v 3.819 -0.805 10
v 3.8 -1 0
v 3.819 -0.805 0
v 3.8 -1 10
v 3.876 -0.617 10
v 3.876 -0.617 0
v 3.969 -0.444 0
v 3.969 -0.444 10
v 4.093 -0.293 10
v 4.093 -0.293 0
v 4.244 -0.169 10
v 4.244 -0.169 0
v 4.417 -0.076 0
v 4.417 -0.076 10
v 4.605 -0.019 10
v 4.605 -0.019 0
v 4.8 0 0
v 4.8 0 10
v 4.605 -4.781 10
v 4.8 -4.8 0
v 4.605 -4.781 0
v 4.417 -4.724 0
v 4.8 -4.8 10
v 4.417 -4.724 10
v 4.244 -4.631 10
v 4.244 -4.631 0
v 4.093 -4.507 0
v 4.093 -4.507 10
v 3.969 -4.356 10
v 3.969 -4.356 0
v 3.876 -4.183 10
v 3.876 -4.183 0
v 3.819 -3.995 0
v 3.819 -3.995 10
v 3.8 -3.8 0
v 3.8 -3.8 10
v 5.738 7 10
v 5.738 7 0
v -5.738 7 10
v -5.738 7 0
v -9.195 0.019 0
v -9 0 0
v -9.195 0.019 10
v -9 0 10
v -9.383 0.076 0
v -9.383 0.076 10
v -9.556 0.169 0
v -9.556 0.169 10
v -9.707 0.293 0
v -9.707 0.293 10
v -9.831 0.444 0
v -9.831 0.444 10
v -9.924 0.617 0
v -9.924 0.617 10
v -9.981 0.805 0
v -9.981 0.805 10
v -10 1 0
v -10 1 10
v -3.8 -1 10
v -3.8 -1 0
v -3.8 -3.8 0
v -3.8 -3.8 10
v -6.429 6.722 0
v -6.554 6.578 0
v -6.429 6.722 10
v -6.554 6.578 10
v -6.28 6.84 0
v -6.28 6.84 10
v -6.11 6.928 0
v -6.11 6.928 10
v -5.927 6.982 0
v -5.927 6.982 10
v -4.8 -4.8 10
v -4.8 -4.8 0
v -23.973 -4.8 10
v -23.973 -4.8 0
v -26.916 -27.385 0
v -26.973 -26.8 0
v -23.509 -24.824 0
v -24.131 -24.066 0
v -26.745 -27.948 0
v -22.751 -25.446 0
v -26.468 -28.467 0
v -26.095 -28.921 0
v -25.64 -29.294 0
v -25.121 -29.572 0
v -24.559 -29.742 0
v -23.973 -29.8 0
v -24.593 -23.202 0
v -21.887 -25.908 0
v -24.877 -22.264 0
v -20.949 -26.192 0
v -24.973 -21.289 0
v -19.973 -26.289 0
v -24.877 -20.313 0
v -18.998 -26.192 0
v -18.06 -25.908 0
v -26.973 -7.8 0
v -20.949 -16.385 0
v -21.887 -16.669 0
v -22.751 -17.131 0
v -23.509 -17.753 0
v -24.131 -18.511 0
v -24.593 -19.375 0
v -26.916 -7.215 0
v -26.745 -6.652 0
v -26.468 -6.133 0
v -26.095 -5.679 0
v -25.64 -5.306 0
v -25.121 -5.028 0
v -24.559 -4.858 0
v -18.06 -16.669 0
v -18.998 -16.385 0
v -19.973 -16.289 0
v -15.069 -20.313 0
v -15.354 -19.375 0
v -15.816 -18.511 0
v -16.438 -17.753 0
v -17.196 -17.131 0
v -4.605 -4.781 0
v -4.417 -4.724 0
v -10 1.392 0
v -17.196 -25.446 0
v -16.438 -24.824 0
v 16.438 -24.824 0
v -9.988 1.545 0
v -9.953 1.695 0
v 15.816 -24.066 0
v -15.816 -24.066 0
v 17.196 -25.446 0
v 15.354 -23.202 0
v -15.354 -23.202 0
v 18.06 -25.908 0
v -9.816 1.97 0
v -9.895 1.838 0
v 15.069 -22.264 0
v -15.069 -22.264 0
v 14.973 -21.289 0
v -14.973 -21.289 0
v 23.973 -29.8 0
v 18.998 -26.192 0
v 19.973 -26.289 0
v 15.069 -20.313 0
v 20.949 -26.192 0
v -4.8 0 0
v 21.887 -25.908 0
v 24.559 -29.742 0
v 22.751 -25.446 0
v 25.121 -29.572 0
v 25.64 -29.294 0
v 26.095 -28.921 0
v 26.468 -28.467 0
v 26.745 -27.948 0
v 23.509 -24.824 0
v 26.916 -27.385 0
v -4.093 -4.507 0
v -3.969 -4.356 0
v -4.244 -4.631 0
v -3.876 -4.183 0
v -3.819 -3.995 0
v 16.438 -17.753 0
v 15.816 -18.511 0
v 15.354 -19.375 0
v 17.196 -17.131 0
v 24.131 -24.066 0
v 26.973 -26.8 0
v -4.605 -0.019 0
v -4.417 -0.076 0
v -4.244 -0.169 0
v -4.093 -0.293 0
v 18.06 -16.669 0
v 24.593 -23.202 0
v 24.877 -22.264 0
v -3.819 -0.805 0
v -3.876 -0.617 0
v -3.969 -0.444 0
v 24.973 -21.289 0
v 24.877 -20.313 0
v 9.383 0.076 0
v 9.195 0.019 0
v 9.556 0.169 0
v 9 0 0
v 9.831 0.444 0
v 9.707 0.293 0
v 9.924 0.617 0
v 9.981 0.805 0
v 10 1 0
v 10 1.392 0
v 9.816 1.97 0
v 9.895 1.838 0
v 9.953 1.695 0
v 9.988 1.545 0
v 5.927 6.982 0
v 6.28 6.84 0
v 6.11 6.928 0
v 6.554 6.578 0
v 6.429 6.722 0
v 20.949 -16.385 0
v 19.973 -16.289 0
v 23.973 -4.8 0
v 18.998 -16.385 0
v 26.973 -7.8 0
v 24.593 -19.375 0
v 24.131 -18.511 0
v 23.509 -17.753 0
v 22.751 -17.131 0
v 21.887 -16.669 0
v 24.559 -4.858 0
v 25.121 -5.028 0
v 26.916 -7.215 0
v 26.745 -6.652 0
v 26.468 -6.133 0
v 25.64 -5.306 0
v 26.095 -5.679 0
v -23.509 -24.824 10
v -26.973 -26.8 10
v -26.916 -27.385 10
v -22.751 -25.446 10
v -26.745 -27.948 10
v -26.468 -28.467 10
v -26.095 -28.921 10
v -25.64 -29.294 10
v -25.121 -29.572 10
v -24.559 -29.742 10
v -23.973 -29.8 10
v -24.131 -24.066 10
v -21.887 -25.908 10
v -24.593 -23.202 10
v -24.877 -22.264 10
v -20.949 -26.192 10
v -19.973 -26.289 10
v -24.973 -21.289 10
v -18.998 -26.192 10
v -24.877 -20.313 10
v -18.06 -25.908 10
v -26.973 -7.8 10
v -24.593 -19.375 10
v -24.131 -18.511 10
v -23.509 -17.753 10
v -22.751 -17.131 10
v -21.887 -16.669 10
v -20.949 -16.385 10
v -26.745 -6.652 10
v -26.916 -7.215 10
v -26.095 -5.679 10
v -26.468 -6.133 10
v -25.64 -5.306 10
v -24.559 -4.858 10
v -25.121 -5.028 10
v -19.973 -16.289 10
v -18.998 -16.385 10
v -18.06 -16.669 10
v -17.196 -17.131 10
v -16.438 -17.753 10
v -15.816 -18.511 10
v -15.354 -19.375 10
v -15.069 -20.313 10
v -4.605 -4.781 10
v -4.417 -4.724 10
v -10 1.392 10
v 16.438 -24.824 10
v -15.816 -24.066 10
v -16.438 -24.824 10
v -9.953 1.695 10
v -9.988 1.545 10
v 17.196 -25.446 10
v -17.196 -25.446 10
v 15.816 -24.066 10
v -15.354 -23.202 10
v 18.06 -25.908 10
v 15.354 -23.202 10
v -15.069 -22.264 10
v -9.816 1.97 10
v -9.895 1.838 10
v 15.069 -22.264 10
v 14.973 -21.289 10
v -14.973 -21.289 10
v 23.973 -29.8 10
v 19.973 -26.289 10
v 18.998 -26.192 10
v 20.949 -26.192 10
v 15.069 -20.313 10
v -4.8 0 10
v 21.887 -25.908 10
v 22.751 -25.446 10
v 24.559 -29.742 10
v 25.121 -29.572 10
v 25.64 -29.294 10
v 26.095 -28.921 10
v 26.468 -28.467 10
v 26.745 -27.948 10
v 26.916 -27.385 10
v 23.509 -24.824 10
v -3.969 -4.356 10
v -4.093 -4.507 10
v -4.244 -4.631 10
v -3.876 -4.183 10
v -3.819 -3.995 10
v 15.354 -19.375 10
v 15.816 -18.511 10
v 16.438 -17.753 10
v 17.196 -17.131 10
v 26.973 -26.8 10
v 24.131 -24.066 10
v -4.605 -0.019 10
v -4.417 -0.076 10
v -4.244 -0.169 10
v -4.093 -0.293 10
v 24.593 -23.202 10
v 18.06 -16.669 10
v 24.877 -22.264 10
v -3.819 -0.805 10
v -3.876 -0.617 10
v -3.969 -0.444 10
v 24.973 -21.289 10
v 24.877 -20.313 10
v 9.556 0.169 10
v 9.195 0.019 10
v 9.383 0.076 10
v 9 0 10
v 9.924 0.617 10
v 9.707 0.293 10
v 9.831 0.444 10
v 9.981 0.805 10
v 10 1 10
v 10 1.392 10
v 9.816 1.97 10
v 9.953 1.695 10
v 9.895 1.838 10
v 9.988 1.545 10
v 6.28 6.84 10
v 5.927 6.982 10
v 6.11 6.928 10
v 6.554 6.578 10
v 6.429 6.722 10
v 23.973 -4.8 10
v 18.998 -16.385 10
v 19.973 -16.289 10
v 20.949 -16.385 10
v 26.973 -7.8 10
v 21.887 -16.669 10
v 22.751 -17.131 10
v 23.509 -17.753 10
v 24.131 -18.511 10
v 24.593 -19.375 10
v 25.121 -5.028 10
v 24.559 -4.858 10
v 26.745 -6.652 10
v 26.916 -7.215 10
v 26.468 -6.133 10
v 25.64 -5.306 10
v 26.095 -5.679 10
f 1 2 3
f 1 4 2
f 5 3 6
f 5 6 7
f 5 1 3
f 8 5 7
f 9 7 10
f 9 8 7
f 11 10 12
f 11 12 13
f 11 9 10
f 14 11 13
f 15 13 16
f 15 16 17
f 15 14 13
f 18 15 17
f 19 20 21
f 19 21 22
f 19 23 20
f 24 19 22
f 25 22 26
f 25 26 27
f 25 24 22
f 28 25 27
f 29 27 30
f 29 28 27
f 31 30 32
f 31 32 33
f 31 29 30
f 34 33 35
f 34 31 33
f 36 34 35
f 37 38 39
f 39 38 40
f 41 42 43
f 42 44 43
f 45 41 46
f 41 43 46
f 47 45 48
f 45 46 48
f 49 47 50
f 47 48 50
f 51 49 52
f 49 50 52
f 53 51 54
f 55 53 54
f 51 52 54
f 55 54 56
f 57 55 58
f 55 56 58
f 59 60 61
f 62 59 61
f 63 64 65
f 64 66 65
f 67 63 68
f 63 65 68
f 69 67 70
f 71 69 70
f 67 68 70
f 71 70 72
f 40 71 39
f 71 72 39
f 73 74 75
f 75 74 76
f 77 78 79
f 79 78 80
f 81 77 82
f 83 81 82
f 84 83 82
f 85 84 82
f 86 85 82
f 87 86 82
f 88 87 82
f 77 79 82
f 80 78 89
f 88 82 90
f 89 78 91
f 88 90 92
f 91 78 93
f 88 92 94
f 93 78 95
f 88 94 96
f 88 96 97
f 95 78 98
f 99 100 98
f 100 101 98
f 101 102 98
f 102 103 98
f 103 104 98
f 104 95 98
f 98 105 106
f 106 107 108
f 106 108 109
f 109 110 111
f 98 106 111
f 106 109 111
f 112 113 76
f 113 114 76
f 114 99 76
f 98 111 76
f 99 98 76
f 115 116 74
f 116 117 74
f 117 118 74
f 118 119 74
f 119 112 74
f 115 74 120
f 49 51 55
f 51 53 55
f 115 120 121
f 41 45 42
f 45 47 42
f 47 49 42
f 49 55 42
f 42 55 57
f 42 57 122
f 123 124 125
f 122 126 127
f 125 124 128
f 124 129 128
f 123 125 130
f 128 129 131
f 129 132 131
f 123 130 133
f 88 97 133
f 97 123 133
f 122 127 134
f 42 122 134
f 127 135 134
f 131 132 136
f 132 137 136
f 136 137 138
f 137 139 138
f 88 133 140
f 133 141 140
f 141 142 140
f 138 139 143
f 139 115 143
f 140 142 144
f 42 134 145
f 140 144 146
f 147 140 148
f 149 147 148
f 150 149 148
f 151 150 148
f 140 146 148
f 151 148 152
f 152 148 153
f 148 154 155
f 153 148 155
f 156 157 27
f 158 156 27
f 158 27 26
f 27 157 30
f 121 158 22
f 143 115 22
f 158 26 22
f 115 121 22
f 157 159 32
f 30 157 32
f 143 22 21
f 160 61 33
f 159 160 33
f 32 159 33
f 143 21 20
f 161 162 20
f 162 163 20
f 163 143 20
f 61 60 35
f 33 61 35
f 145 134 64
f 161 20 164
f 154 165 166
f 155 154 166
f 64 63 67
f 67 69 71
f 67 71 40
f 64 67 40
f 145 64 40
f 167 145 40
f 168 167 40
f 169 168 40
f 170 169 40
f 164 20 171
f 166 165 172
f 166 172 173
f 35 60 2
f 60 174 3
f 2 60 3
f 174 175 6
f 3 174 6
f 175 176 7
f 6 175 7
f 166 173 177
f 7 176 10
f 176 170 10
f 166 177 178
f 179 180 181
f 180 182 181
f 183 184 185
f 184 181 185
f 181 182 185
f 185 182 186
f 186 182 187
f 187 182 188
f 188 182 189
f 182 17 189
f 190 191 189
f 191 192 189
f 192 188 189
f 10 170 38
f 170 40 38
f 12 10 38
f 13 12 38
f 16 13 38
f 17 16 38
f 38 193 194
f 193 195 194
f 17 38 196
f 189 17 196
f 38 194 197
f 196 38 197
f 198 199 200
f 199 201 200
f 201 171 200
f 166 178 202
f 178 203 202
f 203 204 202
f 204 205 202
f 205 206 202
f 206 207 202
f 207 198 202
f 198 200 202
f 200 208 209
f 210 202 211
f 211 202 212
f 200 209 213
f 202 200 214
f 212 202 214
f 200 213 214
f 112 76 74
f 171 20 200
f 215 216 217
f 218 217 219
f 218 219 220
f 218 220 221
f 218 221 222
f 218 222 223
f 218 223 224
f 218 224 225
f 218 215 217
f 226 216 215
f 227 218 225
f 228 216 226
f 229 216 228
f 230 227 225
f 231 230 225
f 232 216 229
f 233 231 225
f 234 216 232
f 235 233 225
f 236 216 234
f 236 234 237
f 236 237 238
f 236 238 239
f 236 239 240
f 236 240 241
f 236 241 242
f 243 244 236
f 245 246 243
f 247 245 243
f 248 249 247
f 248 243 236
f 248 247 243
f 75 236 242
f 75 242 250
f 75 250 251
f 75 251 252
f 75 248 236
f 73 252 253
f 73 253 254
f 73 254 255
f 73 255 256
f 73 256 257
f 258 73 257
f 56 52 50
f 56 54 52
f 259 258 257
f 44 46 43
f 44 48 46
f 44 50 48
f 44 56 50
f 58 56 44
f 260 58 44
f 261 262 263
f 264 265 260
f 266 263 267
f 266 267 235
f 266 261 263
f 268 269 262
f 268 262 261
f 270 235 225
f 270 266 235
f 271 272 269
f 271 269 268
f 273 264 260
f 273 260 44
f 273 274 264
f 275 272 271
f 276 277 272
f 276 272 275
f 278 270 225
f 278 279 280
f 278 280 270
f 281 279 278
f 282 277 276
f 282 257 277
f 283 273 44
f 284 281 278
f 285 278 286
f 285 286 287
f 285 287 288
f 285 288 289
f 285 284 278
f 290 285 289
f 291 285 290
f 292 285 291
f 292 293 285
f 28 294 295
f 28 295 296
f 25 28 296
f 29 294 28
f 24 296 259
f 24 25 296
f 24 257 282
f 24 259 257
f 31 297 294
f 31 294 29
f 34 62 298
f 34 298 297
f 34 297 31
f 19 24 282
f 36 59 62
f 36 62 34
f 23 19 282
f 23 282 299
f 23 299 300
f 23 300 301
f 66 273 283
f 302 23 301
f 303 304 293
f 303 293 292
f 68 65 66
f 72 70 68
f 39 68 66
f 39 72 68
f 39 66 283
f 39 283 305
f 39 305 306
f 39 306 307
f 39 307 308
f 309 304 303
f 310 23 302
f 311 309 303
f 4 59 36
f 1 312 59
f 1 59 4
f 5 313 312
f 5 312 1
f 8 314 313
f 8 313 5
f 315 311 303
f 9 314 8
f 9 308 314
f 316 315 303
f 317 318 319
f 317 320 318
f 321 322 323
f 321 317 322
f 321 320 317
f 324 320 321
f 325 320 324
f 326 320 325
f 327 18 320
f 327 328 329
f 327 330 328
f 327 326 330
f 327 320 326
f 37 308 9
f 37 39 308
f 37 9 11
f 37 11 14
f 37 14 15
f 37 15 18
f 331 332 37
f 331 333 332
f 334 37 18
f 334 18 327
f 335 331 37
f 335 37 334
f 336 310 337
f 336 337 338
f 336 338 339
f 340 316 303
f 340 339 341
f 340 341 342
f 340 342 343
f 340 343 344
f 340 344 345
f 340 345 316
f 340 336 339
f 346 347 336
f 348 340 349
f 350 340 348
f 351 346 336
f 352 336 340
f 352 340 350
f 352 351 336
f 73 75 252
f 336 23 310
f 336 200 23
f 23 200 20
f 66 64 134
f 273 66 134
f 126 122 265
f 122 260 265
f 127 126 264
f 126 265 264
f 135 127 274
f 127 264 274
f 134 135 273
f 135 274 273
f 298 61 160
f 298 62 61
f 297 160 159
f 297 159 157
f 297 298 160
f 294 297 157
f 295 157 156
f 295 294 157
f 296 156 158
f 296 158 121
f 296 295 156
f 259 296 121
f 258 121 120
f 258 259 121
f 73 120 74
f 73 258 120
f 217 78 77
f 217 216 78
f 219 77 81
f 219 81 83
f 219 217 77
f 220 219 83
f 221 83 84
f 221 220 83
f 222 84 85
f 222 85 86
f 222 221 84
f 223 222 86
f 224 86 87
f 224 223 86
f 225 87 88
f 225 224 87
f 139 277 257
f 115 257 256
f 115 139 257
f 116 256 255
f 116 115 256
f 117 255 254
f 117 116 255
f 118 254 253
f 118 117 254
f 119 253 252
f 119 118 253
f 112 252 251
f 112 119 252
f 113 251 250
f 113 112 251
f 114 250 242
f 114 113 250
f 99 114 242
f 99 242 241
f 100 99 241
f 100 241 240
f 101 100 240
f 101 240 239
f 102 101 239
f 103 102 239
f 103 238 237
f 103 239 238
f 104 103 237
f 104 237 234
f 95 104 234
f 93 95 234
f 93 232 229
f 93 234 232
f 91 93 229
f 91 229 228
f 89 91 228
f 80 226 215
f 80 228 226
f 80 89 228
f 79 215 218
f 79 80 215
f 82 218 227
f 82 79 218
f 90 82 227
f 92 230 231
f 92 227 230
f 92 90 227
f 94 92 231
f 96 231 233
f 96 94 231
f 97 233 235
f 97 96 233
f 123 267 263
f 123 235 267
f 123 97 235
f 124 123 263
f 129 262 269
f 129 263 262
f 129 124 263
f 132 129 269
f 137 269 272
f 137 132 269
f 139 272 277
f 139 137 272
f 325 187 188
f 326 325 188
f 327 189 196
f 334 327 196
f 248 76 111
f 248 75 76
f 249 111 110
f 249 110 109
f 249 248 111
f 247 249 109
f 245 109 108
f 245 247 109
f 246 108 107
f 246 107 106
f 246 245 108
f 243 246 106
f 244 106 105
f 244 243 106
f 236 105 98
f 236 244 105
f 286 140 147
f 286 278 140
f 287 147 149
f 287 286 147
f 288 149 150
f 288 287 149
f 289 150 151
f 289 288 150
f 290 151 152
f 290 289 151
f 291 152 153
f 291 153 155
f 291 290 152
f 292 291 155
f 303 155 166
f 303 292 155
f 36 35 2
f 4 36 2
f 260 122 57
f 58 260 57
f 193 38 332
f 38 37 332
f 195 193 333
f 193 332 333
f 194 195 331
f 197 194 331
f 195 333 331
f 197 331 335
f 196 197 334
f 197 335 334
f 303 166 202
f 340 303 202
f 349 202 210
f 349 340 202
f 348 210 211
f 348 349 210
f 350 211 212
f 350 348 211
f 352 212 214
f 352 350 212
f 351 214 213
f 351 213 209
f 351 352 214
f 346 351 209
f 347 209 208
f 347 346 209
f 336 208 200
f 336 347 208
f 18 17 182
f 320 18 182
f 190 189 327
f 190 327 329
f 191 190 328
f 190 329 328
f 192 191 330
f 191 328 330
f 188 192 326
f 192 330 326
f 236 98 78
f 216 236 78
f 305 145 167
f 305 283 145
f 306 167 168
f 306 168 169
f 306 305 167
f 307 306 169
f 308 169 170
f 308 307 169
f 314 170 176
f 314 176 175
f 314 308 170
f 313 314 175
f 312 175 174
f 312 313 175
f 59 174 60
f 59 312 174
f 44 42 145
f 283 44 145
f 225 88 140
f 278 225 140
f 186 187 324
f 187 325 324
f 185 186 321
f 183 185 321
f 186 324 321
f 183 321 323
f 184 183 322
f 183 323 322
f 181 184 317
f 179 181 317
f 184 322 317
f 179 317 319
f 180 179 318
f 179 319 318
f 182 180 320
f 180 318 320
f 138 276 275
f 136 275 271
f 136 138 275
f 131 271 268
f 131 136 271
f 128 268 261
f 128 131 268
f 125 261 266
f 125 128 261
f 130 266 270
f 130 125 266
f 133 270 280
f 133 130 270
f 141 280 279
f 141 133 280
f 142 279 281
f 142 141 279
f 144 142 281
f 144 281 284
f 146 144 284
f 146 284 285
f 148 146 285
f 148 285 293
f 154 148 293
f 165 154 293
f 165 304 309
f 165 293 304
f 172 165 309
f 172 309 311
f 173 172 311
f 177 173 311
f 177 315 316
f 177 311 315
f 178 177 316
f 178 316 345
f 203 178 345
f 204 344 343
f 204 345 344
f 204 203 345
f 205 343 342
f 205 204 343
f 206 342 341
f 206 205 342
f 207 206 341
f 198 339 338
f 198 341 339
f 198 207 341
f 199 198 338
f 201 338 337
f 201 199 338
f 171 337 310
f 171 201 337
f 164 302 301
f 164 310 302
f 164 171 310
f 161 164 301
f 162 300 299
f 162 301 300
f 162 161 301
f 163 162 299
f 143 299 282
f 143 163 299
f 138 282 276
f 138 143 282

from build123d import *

# Parameters (mm, degrees)
BOSS_EXTRUDE1_DEPTH = 10
BOSS_EXTRUDE2_DEPTH = 10
SKETCH5_R           = 5
CUT_EXTRUDE1_DEPTH  = 42.419846722
FILLET1_R           = 1
FILLET2_R           = 1
FILLET3_R           = 3


with BuildPart() as part:
    # Sketch2 → Boss-Extrude1 (new body)
    with BuildSketch(Plane.XY):
        Polygon((-10, 0), (0, 0), (0, 7), (-6.25480432, 7), (-10, 1.709943763), align=None)
        Polygon((0, 0), (10, 0), (10, 1.709943763), (6.25480432, 7), (0, 7), align=None)
    extrude(amount=BOSS_EXTRUDE1_DEPTH)

    # Sketch4 → Boss-Extrude2 (add)
    with BuildSketch(Plane.XY):
        Polygon((0, 0), (-3.8, 0), (-3.8, -4.8), (-26.973388784, -4.8), (-26.973388784, -29.8), (0, -29.8), align=None)
        Polygon((3.8, 0), (0, 0), (0, -29.8), (26.973388784, -29.8), (26.973388784, -4.8), (3.8, -4.8), align=None)
    extrude(amount=BOSS_EXTRUDE2_DEPTH)

    # Sketch5 → Cut-Extrude1 (cut, through all)
    with BuildSketch(Plane.XY):
        with Locations((-19.973388784, -21.288554557)):
            Circle(SKETCH5_R)
        with Locations(Location((19.973388784, -21.288554557, 0), (0, 0, 180))):
            Circle(SKETCH5_R)
    extrude(amount=CUT_EXTRUDE1_DEPTH, mode=Mode.SUBTRACT)

    # Fillet1
    fillet1_edges = [part.edges().sort_by_distance(p)[0] for p in [
        (-10, 0, 5),
        (-10, 1.709943763, 5),
        (-6.25480432, 7, 5),
        (6.25480432, 7, 5),
        (10, 1.709943763, 5),
        (10, 0, 5),
    ]]
    fillet(fillet1_edges, radius=FILLET1_R)

    # Fillet2
    fillet2_edges = [part.edges().sort_by_distance(p)[0] for p in [
        (3.8, -4.8, 5),
        (3.8, 0, 5),
        (-3.8, 0, 5),
        (-3.8, -4.8, 5),
    ]]
    fillet(fillet2_edges, radius=FILLET2_R)

    # Fillet3
    fillet3_edges = [part.edges().sort_by_distance(p)[0] for p in [
        (-26.973388784, -29.8, 5),
        (26.973388784, -29.8, 5),
        (26.973388784, -4.8, 5),
        (-26.973388784, -4.8, 5),
    ]]
    fillet(fillet3_edges, radius=FILLET3_R)


solid = part.part
